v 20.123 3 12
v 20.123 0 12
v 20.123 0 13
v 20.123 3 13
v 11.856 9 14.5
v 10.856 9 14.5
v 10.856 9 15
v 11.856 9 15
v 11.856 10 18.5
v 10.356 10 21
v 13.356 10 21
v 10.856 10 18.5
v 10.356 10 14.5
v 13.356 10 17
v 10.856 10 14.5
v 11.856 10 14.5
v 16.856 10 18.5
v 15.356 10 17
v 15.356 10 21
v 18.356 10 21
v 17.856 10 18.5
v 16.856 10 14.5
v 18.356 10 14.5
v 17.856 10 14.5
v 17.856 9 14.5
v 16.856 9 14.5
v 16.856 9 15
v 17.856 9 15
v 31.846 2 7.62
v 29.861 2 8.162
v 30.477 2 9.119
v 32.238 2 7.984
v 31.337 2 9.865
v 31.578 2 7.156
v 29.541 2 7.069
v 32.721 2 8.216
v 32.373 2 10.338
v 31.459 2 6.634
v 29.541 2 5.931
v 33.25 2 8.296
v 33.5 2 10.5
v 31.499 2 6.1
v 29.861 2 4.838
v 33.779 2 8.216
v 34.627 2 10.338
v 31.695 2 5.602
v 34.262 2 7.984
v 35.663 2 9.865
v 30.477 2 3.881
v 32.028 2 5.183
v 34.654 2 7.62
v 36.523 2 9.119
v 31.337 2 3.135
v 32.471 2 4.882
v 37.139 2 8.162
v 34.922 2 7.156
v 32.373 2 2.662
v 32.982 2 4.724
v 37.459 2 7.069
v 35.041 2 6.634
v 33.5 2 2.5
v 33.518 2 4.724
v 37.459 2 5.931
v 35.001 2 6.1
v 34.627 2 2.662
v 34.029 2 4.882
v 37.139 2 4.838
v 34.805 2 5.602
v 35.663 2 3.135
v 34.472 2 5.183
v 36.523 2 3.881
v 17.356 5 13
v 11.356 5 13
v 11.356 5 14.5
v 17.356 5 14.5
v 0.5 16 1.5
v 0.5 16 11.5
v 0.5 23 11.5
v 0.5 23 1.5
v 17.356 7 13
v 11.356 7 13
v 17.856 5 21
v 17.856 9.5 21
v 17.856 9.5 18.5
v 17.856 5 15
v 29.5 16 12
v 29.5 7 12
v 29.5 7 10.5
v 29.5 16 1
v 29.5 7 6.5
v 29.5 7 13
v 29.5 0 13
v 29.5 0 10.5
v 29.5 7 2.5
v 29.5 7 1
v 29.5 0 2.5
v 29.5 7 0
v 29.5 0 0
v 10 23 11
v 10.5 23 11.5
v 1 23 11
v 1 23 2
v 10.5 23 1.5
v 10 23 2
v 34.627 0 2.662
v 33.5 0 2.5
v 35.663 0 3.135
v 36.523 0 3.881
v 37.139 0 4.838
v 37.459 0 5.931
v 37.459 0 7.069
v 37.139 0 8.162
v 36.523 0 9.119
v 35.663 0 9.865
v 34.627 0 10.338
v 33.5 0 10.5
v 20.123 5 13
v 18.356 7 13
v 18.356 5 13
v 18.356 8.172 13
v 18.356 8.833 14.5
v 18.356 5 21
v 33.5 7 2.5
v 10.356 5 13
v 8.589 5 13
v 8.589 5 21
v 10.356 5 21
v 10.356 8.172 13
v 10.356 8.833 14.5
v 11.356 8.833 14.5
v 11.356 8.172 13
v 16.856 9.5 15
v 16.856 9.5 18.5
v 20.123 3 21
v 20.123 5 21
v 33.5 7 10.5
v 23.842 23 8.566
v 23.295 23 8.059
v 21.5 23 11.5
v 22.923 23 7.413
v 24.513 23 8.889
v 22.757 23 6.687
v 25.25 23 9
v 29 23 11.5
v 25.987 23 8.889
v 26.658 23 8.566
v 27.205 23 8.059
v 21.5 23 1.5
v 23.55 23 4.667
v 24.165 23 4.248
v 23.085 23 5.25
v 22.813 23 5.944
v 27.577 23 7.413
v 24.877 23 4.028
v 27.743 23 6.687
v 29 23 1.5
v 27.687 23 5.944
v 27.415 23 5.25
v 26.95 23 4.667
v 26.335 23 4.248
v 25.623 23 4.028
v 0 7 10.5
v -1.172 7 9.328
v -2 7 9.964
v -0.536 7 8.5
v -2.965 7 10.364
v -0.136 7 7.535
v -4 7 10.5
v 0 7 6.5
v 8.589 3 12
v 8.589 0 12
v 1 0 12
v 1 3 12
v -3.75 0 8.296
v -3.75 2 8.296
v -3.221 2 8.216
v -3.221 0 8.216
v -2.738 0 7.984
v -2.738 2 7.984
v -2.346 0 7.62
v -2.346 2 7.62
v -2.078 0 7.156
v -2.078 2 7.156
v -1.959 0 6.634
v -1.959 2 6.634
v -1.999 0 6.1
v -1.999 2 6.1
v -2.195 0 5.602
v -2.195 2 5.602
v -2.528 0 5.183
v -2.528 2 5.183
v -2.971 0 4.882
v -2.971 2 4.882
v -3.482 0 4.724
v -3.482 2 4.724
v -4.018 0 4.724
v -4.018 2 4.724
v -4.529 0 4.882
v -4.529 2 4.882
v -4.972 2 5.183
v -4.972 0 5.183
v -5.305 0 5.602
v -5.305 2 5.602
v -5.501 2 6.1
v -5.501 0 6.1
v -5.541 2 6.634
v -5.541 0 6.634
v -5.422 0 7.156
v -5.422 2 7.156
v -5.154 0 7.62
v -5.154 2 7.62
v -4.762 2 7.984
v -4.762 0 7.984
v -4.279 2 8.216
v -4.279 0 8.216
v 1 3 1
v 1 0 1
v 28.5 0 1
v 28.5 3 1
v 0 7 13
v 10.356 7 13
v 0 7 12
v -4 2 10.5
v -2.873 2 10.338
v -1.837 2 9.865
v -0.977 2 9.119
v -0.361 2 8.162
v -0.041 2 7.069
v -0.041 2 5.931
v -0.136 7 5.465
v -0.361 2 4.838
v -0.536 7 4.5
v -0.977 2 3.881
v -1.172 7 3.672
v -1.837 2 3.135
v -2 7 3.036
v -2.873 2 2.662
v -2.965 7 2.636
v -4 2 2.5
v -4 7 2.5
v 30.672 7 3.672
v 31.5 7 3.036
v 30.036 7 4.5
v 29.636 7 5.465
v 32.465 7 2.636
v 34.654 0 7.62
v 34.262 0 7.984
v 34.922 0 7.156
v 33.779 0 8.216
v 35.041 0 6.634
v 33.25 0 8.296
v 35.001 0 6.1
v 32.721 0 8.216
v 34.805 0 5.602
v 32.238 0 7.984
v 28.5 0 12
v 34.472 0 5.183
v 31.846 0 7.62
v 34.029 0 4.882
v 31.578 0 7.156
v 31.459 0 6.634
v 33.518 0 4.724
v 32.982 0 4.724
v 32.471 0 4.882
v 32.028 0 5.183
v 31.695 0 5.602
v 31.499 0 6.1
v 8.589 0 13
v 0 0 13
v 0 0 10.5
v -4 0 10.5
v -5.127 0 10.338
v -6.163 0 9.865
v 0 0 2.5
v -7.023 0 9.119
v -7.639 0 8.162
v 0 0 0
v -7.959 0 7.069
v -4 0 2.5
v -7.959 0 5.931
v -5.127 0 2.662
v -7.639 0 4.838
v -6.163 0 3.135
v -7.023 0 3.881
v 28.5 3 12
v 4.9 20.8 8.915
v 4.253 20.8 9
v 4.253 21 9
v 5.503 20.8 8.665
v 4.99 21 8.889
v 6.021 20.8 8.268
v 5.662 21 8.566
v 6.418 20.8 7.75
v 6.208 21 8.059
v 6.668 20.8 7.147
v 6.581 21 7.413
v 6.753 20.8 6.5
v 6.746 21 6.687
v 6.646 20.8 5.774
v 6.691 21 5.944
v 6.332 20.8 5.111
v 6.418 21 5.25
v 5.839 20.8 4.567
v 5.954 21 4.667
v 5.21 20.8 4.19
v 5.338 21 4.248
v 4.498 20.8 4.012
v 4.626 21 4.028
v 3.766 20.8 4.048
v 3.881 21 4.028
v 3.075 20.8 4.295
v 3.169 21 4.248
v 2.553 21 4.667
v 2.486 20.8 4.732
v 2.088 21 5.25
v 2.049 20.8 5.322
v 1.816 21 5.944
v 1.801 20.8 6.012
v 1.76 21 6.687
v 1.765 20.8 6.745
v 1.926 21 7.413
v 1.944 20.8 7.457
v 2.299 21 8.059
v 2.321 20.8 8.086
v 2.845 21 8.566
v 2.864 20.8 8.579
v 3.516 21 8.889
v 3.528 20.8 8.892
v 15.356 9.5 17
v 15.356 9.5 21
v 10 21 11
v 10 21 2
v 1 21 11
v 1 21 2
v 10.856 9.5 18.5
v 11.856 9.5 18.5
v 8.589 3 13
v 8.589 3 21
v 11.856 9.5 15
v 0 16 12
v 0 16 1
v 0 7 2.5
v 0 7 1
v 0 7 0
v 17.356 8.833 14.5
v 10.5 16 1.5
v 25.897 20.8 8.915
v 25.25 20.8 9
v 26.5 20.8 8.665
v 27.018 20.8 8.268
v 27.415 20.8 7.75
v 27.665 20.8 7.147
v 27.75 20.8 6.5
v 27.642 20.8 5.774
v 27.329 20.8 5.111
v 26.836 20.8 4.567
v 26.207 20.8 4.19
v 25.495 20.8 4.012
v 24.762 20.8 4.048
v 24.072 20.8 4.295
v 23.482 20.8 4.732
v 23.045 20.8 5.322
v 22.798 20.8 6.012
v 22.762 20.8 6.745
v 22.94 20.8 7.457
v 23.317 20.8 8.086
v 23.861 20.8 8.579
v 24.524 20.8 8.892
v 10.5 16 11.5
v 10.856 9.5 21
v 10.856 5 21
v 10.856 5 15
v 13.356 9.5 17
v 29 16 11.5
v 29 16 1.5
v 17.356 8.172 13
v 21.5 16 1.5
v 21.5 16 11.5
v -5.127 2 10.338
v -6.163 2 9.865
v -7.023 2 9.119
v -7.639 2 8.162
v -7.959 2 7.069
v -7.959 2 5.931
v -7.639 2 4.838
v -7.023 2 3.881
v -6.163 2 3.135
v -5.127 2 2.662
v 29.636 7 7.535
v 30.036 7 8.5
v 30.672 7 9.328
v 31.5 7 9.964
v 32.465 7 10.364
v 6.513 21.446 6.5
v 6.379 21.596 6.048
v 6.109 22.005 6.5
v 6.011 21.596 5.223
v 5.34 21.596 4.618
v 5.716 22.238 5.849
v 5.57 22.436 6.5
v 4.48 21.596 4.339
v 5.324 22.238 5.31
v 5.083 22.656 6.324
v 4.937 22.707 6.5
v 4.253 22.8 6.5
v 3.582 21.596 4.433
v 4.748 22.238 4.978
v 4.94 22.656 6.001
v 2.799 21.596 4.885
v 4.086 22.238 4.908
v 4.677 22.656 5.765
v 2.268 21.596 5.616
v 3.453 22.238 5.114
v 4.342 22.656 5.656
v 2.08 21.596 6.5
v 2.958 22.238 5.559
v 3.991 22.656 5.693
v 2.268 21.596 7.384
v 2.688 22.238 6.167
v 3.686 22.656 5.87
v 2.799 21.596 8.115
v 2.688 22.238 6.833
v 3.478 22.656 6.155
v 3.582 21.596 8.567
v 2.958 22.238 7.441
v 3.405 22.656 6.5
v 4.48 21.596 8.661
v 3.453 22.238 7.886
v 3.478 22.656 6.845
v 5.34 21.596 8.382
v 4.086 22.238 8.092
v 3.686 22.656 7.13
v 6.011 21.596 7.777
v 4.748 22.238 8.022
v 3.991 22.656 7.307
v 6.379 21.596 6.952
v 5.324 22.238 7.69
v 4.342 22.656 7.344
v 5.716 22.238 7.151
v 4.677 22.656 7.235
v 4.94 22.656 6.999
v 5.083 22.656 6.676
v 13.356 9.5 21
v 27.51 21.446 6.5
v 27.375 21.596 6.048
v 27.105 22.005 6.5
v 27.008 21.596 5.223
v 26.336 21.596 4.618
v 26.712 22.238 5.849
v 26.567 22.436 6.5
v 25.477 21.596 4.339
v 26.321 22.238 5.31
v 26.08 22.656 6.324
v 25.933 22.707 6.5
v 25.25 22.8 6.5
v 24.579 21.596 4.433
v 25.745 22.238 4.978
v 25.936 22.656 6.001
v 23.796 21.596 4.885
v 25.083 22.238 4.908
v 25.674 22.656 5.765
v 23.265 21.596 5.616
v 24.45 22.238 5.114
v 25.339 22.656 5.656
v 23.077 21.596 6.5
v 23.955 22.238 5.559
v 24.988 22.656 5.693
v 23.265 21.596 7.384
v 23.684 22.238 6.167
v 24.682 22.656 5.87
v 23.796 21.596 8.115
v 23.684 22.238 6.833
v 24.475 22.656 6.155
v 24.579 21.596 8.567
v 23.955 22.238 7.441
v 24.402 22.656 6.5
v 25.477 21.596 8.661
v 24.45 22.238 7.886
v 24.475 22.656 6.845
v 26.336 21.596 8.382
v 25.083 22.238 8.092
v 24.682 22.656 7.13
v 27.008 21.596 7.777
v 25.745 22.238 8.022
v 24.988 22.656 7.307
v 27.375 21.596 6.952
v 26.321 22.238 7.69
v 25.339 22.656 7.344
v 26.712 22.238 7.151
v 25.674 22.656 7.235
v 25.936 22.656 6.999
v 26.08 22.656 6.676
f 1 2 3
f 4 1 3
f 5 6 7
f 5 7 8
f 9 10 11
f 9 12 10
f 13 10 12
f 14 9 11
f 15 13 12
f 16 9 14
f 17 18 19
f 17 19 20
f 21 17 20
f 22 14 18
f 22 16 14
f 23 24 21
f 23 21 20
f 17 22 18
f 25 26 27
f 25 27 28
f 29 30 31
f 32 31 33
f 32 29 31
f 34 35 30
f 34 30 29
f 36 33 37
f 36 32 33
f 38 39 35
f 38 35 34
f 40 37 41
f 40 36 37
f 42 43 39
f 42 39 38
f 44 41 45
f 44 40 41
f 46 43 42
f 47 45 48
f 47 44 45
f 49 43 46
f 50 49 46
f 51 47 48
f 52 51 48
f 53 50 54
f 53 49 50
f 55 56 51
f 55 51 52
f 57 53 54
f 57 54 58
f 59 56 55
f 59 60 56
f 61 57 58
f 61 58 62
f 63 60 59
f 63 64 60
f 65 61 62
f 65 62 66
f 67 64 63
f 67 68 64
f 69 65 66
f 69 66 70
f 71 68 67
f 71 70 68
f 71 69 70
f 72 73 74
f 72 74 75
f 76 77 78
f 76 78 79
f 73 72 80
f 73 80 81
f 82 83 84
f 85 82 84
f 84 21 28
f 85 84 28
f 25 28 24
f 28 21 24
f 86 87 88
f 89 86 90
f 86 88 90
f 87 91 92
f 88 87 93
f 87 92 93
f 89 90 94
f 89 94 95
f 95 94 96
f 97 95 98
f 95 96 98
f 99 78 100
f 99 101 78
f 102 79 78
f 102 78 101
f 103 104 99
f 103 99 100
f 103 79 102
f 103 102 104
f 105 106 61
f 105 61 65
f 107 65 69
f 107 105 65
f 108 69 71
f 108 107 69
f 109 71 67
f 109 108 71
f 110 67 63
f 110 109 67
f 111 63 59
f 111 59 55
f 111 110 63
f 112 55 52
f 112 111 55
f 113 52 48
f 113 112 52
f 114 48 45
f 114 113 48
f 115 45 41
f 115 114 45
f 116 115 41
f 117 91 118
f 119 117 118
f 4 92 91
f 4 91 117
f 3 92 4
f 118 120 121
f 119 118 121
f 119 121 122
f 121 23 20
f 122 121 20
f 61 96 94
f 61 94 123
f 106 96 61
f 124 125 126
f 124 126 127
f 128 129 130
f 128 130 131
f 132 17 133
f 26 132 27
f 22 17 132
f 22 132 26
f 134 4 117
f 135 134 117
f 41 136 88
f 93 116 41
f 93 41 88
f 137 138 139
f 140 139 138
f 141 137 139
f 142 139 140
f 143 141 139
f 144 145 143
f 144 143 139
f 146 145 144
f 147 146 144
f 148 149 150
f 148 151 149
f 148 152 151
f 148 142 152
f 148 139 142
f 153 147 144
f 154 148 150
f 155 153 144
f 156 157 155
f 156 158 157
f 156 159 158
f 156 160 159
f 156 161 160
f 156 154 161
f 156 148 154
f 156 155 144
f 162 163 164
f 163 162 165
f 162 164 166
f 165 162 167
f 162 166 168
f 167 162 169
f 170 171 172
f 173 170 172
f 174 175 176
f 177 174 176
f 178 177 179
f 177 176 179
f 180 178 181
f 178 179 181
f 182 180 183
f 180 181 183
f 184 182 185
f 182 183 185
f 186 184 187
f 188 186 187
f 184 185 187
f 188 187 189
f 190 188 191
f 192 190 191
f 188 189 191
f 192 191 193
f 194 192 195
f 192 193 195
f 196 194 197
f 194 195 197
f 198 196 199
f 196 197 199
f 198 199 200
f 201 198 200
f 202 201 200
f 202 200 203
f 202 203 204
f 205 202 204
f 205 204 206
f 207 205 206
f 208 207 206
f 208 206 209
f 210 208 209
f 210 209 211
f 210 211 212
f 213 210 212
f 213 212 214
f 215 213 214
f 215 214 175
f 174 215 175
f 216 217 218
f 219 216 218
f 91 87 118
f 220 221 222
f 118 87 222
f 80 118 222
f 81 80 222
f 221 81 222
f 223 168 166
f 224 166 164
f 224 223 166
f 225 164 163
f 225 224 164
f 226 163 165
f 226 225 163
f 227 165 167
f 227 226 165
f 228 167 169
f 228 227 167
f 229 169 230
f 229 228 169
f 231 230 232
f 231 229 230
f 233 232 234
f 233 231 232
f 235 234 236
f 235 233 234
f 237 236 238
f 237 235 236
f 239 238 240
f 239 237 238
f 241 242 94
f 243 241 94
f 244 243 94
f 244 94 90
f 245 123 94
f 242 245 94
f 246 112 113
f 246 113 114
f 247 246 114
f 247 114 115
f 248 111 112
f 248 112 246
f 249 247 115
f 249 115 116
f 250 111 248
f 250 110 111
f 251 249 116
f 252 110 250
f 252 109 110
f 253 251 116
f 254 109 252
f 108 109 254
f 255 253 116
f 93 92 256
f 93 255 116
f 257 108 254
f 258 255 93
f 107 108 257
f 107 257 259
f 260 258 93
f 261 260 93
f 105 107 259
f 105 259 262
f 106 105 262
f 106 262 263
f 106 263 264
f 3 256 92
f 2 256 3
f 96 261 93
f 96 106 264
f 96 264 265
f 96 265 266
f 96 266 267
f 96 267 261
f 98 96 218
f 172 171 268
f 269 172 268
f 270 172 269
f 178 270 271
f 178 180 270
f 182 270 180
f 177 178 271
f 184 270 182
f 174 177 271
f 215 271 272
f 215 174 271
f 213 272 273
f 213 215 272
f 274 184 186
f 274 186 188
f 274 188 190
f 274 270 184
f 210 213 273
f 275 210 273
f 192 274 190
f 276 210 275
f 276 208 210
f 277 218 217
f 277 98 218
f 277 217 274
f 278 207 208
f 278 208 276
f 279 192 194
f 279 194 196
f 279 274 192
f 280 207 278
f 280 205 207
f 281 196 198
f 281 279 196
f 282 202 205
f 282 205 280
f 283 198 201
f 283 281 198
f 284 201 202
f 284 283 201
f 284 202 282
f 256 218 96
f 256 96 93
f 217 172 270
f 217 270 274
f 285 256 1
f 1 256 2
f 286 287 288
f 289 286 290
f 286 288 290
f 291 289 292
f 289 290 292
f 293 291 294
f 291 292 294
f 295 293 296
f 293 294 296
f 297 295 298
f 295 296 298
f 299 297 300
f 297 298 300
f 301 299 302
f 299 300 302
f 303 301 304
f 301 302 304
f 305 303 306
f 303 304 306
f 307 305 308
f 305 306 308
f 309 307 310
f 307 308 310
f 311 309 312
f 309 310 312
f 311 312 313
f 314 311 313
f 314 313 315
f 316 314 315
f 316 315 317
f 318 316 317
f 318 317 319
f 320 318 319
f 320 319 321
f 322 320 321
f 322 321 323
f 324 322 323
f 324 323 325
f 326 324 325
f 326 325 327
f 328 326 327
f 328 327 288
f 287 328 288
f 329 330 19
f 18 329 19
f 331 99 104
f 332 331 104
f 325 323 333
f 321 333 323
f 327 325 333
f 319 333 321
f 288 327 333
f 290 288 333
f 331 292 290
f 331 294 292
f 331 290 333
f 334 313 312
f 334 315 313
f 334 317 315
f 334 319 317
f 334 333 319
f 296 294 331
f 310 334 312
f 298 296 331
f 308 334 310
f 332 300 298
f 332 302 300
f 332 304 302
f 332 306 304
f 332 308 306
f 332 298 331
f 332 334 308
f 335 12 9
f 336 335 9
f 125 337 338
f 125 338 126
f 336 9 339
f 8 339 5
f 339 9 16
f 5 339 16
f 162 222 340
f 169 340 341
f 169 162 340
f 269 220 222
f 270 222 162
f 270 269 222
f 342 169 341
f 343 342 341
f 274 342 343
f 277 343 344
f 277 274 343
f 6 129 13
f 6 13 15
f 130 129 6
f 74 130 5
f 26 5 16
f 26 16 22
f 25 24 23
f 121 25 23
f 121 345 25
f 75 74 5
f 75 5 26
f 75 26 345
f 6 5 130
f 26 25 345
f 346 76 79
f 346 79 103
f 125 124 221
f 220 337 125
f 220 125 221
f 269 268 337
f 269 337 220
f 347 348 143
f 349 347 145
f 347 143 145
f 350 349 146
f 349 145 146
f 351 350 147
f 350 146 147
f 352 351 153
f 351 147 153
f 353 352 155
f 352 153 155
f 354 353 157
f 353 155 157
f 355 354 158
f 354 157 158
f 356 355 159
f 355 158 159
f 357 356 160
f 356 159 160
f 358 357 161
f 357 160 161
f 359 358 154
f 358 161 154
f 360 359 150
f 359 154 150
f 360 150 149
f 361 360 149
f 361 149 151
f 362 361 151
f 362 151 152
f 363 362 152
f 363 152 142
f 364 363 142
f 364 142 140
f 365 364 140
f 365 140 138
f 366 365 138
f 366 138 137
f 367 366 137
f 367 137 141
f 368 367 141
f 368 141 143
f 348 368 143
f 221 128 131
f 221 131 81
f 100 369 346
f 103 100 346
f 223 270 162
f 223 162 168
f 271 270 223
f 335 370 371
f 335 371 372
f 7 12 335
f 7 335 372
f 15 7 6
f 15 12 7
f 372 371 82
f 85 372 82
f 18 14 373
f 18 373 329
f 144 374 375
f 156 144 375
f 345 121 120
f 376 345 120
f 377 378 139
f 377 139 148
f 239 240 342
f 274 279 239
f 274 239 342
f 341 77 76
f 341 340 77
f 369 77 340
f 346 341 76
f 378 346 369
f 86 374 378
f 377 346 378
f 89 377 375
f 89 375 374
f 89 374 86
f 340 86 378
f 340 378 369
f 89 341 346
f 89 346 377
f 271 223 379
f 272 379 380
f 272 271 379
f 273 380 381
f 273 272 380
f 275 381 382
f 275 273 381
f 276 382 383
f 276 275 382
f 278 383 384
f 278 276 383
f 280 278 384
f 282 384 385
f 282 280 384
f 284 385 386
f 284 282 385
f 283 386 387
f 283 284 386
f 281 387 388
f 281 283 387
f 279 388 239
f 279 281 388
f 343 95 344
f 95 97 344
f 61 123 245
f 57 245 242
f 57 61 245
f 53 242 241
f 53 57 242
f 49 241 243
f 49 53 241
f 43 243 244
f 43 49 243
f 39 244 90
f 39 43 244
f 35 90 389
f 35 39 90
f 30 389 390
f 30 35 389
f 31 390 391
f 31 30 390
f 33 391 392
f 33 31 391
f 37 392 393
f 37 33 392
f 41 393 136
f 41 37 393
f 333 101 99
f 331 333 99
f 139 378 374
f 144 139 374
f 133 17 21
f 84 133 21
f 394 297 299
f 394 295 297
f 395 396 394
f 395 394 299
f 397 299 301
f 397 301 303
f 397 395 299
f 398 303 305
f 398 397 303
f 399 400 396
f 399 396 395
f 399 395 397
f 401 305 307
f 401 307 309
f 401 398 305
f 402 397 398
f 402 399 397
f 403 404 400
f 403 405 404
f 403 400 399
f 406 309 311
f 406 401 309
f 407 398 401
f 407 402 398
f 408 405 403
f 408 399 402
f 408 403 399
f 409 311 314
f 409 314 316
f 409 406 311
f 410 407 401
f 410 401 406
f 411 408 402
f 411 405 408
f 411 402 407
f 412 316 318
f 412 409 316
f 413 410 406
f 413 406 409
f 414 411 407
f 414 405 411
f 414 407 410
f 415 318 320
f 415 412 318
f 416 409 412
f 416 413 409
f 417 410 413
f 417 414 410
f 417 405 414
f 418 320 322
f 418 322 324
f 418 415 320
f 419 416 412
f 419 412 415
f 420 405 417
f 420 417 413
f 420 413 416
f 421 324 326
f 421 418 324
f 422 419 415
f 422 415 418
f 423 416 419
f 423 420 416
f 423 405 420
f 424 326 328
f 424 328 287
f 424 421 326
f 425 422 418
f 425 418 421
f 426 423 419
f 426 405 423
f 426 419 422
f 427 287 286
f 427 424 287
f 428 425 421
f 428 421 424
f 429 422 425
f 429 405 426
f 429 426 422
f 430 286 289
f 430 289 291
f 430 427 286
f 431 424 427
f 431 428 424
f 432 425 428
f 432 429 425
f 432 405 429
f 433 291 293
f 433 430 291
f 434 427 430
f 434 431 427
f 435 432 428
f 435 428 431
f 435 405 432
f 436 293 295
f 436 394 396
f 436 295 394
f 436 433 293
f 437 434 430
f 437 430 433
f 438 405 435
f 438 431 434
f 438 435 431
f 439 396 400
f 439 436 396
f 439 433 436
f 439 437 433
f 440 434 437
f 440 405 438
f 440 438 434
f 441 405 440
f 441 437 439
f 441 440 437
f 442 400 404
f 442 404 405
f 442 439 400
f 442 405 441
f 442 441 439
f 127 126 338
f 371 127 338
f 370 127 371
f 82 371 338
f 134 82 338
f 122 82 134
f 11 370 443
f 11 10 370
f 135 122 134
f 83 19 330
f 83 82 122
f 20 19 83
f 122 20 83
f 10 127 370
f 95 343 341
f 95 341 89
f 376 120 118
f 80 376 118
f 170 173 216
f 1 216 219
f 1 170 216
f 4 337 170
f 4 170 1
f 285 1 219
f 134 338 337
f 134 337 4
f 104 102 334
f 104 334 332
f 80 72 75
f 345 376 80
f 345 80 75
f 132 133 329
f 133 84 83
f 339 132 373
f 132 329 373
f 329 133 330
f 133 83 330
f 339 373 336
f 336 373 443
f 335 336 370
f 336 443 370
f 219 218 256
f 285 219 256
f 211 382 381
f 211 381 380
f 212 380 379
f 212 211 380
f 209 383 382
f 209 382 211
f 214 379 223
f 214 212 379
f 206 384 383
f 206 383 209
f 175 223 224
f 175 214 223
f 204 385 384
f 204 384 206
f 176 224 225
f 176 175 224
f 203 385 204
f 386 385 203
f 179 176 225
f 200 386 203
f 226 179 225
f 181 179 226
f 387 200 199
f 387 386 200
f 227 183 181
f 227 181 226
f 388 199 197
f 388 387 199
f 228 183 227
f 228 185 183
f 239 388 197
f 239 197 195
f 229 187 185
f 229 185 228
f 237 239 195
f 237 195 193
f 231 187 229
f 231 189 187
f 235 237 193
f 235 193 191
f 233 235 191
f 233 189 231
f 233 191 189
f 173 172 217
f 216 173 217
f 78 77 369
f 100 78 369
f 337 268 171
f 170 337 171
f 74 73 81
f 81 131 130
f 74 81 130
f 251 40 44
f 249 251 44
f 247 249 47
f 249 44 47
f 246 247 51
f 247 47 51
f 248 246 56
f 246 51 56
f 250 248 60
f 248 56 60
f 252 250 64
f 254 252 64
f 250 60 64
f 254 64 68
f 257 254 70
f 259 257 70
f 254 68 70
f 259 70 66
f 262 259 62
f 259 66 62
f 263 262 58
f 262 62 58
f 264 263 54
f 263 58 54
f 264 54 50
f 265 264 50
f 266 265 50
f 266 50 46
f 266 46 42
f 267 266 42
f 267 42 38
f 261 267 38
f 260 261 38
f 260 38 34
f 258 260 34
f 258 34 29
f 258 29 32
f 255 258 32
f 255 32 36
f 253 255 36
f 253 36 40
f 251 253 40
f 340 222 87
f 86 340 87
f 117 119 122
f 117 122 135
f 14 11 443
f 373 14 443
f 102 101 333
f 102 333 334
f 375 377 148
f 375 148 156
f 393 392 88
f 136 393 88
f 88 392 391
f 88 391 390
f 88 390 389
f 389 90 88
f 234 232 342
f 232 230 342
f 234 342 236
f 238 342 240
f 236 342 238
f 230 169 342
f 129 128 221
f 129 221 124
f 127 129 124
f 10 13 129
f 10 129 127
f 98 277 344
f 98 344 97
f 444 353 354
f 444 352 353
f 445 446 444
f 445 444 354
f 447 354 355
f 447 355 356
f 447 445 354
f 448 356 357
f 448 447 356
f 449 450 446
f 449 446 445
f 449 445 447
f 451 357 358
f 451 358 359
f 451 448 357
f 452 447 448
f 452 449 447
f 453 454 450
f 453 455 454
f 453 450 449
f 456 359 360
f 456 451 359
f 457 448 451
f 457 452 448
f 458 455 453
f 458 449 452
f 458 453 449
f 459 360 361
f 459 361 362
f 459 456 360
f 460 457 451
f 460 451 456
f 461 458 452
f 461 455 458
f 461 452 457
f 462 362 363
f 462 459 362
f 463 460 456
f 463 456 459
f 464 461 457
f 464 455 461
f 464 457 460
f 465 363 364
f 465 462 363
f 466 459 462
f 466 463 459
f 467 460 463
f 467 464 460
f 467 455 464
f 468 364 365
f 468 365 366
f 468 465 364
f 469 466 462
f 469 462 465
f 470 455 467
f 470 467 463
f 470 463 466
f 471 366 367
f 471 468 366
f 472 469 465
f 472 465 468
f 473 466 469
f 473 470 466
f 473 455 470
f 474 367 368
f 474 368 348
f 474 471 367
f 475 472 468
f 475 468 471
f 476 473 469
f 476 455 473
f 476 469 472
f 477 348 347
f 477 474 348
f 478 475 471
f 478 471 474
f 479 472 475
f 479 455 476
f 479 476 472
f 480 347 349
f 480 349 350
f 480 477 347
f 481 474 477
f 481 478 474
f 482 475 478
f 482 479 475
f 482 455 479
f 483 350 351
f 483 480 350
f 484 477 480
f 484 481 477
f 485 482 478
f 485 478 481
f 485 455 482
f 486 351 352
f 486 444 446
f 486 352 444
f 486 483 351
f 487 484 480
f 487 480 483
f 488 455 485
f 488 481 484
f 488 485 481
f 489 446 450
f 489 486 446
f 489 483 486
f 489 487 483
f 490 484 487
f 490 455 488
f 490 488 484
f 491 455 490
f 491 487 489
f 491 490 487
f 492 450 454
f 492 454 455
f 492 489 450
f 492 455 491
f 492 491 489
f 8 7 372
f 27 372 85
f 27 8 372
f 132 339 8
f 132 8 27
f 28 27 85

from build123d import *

# Parameters (mm, degrees)
EXTRUDE_1_DEPTH     = 7
CUT_EXTRUDE_START   = -5
SKETCH_2_R          = 4
CUT_EXTRUDE_1_DEPTH = 5
SKETCH_3_W          = 29.5
SKETCH_3_H          = 11
EXTRUDE_2_DEPTH     = 9
SKETCH_4_W          = 7.5
SKETCH_4_H          = 10
SKETCH_4_W_2        = 10
EXTRUDE_3_DEPTH     = 7
SKETCH_5_W          = 9
SKETCH_5_H          = 9
CUT_EXTRUDE_2_DEPTH = 2
SKETCH_6_R          = 2.5
CUT_EXTRUDE_3_DEPTH = 2.2
SKETCH_7_R          = 1.796075295
CUT_EXTRUDE_4_DEPTH = 45.902672526
SKETCH_8_W          = 11.533749137
SKETCH_8_H          = 5
EXTRUDE_4_DEPTH     = 8
CUT_EXTRUDE_5_DEPTH = 3
SKETCH_11_W         = 8
SKETCH_11_H         = 6.5
EXTRUDE_6_DEPTH     = 5
EXTRUDE_7_DEPTH     = 1
EXTRUDE_8_DEPTH     = 1
CUT_EXTRUDE_6_DEPTH = 4
SKETCH_15_W         = 7
SKETCH_15_H         = 4.5
CUT_EXTRUDE_7_DEPTH = 2
SKETCH_16_W         = 1
SKETCH_16_H         = 4
CUT_EXTRUDE_8_DEPTH = 1


# Read off the part's stored shape, not the designer's step: 圆顶1, 圆顶2
with BuildPart() as part:
    # 草图1 → 凸台-拉伸1 (new body)
    with BuildSketch(Plane(origin=(0, 0, 0), x_dir=(1, 0, 0), z_dir=(0, 1, 0))):
        with BuildLine():
            Line((0, 0), (29.5, 0))
            Line((29.5, 0), (29.5, -2.5))
            Line((29.5, -2.5), (33.5, -2.5))
            ThreePointArc((33.5, -2.5), (37.5, -6.5), (33.5, -10.5))
            Line((33.5, -10.5), (29.5, -10.5))
            Line((29.5, -10.5), (29.5, -13))
            Line((29.5, -13), (0, -13))
            Line((0, -13), (0, -10.5))
            Line((0, -10.5), (-4, -10.5))
            ThreePointArc((-4, -10.5), (-8, -6.5), (-4, -2.5))
            Line((-4, -2.5), (0, -2.5))
            Line((0, -2.5), (0, 0))
        make_face()
    extrude(amount=EXTRUDE_1_DEPTH)

    # 草图2 → 切除-拉伸1 (cut)
    with BuildSketch(Plane(origin=(0, 7, 0), x_dir=(1, 0, 0), z_dir=(0, 1, 0)).offset(CUT_EXTRUDE_START)):
        with Locations((-4, -6.5)):
            Circle(SKETCH_2_R)
        with Locations((33.5, -6.5)):
            Circle(SKETCH_2_R)
    extrude(amount=CUT_EXTRUDE_1_DEPTH, mode=Mode.SUBTRACT)

    # 草图3 → 凸台-拉伸2 (add)
    with BuildSketch(Plane(origin=(0, 7, 0), x_dir=(1, 0, 0), z_dir=(0, 1, 0))):
        with Locations((14.75, -6.5)):
            Rectangle(SKETCH_3_W, SKETCH_3_H)
    extrude(amount=EXTRUDE_2_DEPTH)

    # 草图4 → 凸台-拉伸3 (add)
    with BuildSketch(Plane(origin=(0, 16, 0), x_dir=(1, 0, 0), z_dir=(0, 1, 0))):
        with Locations((25.25, -6.5)):
            Rectangle(SKETCH_4_W, SKETCH_4_H)
        with Locations((5.5, -6.5)):
            Rectangle(SKETCH_4_W_2, SKETCH_4_H)
    extrude(amount=EXTRUDE_3_DEPTH)

    # 草图5 → 切除-拉伸2 (cut)
    with BuildSketch(Plane(origin=(0, 23, 0), x_dir=(1, 0, 0), z_dir=(0, 1, 0))):
        with Locations((5.5, -6.5)):
            Rectangle(SKETCH_5_W, SKETCH_5_H)
    extrude(amount=-CUT_EXTRUDE_2_DEPTH, mode=Mode.SUBTRACT)

    # 草图6 → 切除-拉伸3 (cut)
    with BuildSketch(Plane(origin=(0, 23, 0), x_dir=(1, 0, 0), z_dir=(0, 1, 0))):
        with Locations(Location((25.25, -6.5, 0), (0, 0, 270))):
            Circle(SKETCH_6_R)
        with Locations(Location((4.253331237, -6.5, 0), (0, 0, 270))):
            Circle(SKETCH_6_R)
    extrude(amount=-CUT_EXTRUDE_3_DEPTH, mode=Mode.SUBTRACT)

    # 圆顶1 outline → 圆顶1 (revolve)
    with BuildSketch(Plane(origin=(4.253331237, 0, 6.5), x_dir=(1, 0, 0), z_dir=(0, 0, 1))):
        with BuildLine():
            Line((0, 20.8), (2.500000001, 20.799999998))
            ThreePointArc((2.500000001, 20.799999998), (1.60078106, 22.238476323), (0, 22.8))
            Line((0, 22.8), (0, 20.8))
        make_face()
    revolve(axis=Axis((4.253331237, 0, 6.5), (0, 1, 0)))

    # 圆顶2 outline → 圆顶2 (revolve)
    with BuildSketch(Plane(origin=(25.25, 0, 6.5), x_dir=(1, 0, 0), z_dir=(0, 0, 1))):
        with BuildLine():
            Line((0, 20.8), (2.500000001, 20.799999997))
            ThreePointArc((2.500000001, 20.799999997), (1.60078106, 22.238476323), (0, 22.8))
            Line((0, 22.8), (0, 20.8))
        make_face()
    revolve(axis=Axis((25.25, 0, 6.5), (0, 1, 0)))

    # 草图7 → 切除-拉伸4 (cut, through all)
    with BuildSketch(Plane(origin=(0, 2, 0), x_dir=(1, 0, 0), z_dir=(0, 1, 0))):
        with Locations(Location((-3.75, -6.5, 0), (0, 0, 270))):
            Circle(SKETCH_7_R)
        with Locations(Location((33.25, -6.5, 0), (0, 0, 270))):
            Circle(SKETCH_7_R)
    extrude(amount=-CUT_EXTRUDE_4_DEPTH, mode=Mode.SUBTRACT)

    # 草图8 → 凸台-拉伸4 (add)
    with BuildSketch(Plane.XY.offset(13)):
        with Locations((14.355989937, 2.5)):
            Rectangle(SKETCH_8_W, SKETCH_8_H)
    extrude(amount=EXTRUDE_4_DEPTH)

    # 草图10 → 切除-拉伸5 (cut)
    with BuildSketch(Plane.XZ):
        Polygon((8.589115368, 21), (8.589115368, 12), (1, 12), (1, 1), (28.5, 1), (28.5, 12), (20.122864505, 12), (20.122864505, 21), align=None)
    extrude(amount=-CUT_EXTRUDE_5_DEPTH, mode=Mode.SUBTRACT)

    # 草图11 → 凸台-拉伸6 (add)
    with BuildSketch(Plane(origin=(0, 5, 0), x_dir=(1, 0, 0), z_dir=(0, 1, 0))):
        with Locations((14.355989936, -17.75)):
            Rectangle(SKETCH_11_W, SKETCH_11_H)
    extrude(amount=EXTRUDE_6_DEPTH)

    # 草图12 → 凸台-拉伸7 (add)
    with BuildSketch(Plane(origin=(18.355989936, 0, 0), x_dir=(0, 0, -1), z_dir=(1, 0, 0))):
        Polygon((-14.5, 8.832927064), (-13, 8.172497524), (-13, 5), (-14.5, 5), align=None)
    extrude(amount=-EXTRUDE_7_DEPTH)

    # 草图13 → 凸台-拉伸8 (add)
    with BuildSketch(Plane.ZY.offset(-10.355989936)):
        Polygon((14.5, 8.832927064), (13, 8.172497524), (13, 5), (14.5, 5), align=None)
    extrude(amount=-EXTRUDE_8_DEPTH)

    # 草图14 → 切除-拉伸6 (cut)
    with BuildSketch(Plane.XY.offset(21)):
        Polygon((10.855989936, 5), (17.855989936, 5), (17.855989936, 9.5), (15.355989936, 9.5), (15.355989936, 10), (13.355989936, 10), (13.355989936, 9.5), (10.855989936, 9.5), align=None)
    extrude(amount=-CUT_EXTRUDE_6_DEPTH, mode=Mode.SUBTRACT)

    # 草图15 → 切除-拉伸7 (cut)
    with BuildSketch(Plane.XY.offset(17)):
        with Locations((14.355989936, 7.25)):
            Rectangle(SKETCH_15_W, SKETCH_15_H)
    extrude(amount=-CUT_EXTRUDE_7_DEPTH, mode=Mode.SUBTRACT)

    # 草图16 → 切除-拉伸8 (cut)
    with BuildSketch(Plane(origin=(0, 10, 0), x_dir=(1, 0, 0), z_dir=(0, 1, 0))):
        with Locations((11.355989936, -16.5)):
            Rectangle(SKETCH_16_W, SKETCH_16_H)
        with Locations((17.355989936, -16.5)):
            Rectangle(SKETCH_16_W, SKETCH_16_H)
    extrude(amount=-CUT_EXTRUDE_8_DEPTH, mode=Mode.SUBTRACT)


solid = part.part
